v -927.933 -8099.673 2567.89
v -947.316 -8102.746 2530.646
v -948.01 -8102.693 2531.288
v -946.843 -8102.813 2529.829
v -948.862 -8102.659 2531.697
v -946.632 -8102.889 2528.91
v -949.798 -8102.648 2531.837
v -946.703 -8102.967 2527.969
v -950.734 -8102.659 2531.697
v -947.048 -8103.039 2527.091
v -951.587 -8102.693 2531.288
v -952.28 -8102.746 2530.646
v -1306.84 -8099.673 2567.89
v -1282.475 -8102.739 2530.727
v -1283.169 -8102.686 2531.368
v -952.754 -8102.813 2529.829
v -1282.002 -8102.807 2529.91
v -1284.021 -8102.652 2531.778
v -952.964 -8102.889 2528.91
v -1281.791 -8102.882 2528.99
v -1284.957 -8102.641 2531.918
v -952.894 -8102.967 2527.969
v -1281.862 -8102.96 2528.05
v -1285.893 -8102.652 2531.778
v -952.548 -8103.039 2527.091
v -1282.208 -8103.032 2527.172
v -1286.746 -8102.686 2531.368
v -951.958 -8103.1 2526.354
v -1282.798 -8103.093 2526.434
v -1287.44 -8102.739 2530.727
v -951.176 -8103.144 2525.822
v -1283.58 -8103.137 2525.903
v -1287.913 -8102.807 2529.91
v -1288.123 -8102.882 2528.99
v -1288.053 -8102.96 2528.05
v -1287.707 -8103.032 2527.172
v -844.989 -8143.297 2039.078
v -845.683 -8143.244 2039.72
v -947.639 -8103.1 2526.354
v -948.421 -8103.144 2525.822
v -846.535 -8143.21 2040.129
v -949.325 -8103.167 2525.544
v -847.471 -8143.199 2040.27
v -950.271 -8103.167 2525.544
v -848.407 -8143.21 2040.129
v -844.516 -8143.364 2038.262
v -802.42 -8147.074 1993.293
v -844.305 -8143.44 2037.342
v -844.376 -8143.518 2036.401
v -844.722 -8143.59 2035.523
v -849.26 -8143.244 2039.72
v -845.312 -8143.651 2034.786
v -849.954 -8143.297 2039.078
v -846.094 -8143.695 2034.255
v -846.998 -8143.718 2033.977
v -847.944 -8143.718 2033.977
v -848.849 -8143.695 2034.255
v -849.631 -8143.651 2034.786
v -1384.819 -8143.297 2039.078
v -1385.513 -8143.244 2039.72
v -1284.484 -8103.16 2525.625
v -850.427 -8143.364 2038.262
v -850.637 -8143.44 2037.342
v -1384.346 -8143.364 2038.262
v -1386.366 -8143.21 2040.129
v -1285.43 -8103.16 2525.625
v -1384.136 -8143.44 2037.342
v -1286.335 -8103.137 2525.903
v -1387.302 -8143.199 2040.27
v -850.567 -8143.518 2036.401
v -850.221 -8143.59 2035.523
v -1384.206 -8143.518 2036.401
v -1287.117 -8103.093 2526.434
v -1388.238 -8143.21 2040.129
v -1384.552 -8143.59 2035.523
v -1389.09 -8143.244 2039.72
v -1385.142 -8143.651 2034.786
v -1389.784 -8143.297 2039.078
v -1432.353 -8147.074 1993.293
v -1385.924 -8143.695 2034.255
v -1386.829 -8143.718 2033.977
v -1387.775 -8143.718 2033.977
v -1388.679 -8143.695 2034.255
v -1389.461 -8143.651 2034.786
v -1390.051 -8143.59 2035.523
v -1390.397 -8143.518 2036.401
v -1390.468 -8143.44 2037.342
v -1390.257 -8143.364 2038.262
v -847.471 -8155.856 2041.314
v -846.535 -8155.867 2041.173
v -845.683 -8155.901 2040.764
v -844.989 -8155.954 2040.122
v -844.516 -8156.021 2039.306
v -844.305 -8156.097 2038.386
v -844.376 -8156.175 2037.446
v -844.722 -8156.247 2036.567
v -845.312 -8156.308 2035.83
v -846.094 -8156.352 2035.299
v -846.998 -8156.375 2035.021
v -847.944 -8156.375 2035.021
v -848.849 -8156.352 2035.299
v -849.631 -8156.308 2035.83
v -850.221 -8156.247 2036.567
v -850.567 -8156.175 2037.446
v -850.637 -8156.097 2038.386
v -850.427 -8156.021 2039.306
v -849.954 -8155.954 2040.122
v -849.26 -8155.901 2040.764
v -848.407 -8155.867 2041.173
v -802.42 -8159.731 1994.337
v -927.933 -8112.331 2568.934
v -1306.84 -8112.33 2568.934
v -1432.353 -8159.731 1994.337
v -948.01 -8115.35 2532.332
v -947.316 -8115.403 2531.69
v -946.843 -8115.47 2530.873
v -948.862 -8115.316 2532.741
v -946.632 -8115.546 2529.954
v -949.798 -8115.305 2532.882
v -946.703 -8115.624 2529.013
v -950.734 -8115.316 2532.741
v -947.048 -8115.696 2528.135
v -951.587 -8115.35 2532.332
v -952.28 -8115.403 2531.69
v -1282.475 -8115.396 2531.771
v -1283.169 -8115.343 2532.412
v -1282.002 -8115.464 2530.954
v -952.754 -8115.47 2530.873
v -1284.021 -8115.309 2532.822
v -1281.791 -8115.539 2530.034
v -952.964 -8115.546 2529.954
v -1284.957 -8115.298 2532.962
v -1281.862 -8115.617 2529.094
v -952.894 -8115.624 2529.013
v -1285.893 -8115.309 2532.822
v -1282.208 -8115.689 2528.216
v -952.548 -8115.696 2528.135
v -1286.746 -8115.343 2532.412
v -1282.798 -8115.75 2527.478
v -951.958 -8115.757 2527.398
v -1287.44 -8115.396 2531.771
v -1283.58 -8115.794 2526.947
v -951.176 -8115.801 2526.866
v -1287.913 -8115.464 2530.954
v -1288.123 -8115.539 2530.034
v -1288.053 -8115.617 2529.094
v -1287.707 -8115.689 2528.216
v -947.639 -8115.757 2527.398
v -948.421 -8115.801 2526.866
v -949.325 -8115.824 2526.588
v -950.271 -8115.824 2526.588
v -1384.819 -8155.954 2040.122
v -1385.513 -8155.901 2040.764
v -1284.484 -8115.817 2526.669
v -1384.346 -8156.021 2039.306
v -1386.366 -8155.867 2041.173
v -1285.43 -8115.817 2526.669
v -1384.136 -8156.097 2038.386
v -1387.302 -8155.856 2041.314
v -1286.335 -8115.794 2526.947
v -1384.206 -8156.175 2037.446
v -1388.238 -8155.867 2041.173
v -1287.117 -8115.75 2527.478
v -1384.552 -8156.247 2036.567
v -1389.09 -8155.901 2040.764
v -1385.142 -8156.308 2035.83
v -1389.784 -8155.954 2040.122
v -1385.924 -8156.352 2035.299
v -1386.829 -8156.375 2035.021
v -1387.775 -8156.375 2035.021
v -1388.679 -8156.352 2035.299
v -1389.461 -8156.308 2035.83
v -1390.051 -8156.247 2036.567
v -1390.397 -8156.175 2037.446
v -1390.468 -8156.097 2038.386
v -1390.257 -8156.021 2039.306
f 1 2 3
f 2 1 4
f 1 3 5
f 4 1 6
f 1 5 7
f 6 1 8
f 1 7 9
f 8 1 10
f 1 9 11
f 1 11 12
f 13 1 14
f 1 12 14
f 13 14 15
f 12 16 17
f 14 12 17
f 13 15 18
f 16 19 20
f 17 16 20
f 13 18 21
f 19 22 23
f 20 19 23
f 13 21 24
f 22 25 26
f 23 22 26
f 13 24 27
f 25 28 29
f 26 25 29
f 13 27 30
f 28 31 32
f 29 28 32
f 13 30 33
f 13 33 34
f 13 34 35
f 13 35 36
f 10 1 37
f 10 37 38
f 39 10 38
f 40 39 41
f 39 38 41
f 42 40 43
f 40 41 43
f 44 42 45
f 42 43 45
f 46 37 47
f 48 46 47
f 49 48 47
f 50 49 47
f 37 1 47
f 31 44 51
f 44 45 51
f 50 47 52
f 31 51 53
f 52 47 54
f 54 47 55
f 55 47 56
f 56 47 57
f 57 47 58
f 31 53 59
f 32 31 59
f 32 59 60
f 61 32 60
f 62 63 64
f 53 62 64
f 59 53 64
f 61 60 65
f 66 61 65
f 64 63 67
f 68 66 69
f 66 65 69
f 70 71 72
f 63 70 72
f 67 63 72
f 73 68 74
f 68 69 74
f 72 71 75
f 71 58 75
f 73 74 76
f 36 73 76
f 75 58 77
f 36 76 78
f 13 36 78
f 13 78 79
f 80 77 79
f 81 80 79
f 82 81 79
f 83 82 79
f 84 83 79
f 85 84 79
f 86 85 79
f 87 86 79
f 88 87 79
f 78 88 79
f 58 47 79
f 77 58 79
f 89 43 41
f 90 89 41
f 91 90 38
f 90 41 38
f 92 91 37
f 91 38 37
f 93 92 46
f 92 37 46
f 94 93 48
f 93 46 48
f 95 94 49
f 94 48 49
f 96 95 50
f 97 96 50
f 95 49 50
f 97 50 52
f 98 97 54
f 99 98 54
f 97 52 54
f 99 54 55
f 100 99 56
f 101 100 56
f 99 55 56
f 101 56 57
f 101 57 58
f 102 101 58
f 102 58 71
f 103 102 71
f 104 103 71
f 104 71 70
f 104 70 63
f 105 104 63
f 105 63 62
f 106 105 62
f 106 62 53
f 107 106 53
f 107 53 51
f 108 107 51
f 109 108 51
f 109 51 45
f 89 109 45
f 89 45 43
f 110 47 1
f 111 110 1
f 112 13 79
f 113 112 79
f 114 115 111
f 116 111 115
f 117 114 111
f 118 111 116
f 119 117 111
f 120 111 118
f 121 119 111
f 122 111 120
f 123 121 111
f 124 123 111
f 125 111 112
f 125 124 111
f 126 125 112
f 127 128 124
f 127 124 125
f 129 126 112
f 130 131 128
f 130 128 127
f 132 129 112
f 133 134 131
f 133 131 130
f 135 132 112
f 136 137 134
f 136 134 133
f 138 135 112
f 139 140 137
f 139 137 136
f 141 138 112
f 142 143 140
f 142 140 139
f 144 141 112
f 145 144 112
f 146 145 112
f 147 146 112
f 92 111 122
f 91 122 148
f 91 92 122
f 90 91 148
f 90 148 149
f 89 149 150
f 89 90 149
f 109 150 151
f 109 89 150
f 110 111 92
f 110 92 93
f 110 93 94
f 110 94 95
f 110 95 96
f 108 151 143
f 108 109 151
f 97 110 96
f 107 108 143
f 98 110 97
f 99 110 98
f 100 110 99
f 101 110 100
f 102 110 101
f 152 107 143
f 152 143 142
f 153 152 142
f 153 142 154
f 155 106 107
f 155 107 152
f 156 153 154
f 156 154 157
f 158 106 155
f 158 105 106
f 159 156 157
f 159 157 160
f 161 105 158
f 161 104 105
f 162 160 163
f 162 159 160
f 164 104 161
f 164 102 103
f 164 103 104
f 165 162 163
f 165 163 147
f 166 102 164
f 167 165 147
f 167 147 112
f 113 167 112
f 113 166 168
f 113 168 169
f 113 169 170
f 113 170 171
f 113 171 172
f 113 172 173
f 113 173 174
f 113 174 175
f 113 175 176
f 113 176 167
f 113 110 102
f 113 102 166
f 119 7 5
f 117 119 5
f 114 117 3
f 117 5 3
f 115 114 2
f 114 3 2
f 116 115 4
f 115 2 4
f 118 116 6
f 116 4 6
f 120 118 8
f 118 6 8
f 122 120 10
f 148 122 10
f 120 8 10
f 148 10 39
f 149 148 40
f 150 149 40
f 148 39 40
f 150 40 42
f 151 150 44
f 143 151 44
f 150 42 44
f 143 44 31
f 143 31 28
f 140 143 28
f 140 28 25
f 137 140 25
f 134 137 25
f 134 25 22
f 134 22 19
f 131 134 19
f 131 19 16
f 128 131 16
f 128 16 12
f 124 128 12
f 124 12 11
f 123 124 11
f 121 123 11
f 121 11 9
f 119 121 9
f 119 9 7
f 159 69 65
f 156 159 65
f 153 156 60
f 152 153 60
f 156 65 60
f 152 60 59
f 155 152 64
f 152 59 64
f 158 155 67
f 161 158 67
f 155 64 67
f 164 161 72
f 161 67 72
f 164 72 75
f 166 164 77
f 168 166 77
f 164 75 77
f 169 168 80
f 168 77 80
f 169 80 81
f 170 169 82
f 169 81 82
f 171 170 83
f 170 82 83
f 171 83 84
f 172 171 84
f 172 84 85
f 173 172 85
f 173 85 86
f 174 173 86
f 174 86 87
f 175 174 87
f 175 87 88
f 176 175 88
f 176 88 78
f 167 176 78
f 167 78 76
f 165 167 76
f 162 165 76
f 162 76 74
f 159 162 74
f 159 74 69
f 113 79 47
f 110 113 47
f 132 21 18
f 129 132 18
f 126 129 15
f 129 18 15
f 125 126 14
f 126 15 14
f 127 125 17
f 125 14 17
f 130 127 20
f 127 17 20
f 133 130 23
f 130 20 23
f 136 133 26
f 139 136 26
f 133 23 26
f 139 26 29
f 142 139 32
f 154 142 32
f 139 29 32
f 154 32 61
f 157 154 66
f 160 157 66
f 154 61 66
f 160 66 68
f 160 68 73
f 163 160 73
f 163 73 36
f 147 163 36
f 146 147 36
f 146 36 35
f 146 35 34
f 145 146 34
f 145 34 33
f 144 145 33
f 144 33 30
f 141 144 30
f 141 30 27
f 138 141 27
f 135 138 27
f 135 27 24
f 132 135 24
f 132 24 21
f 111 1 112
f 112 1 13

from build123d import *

# Parameters (mm, degrees)
BOSS_EXTRUDE1_DEPTH = 12.7
SKETCH2_R           = 3.175000002
CUT_EXTRUDE1_DEPTH  = 2375.892579794


with BuildPart() as part:
    # Sketch1 → Boss-Extrude1 (new body)
    with BuildSketch(Plane(origin=(-0.000661708, -8255.328766721, 681.010699718), x_dir=(-0.9999999999999969, 7.961414168714261e-08, -6.567661367452003e-09), z_dir=(-7.988457756299225e-08, -0.996614682353027, 0.08221420143970737))):
        Polygon((927.932358973, -1893.28840213), (1306.839320092, -1893.28840213), (1432.35206282, -1316.739819062), (802.419616245, -1316.739819062), align=None)
    extrude(amount=BOSS_EXTRUDE1_DEPTH)

    # Sketch2 → Cut-Extrude1 (cut, through all)
    with BuildSketch(Plane(origin=(-0.000661714, -8255.328766721, 681.010699718), x_dir=(0.9999999999999968, -7.961414422751635e-08, 6.5676468617910225e-09), z_dir=(7.988457890219468e-08, 0.9966146823530272, -0.08221420143970452))):
        with Locations(Location((-1284.956595837, -1854.019614904, 0), (0, 0, 270))):
            Circle(SKETCH2_R)
        with Locations(Location((-949.797461581, -1853.938669103, 0), (0, 0, 270))):
            Circle(SKETCH2_R)
        with Locations(Location((-1387.301054815, -1360.701208825, 0), (0, 0, 270))):
            Circle(SKETCH2_R)
        with Locations(Location((-847.47062424, -1360.701208825, 0), (0, 0, 270))):
            Circle(SKETCH2_R)
    extrude(amount=-CUT_EXTRUDE1_DEPTH, mode=Mode.SUBTRACT)


solid = part.part
